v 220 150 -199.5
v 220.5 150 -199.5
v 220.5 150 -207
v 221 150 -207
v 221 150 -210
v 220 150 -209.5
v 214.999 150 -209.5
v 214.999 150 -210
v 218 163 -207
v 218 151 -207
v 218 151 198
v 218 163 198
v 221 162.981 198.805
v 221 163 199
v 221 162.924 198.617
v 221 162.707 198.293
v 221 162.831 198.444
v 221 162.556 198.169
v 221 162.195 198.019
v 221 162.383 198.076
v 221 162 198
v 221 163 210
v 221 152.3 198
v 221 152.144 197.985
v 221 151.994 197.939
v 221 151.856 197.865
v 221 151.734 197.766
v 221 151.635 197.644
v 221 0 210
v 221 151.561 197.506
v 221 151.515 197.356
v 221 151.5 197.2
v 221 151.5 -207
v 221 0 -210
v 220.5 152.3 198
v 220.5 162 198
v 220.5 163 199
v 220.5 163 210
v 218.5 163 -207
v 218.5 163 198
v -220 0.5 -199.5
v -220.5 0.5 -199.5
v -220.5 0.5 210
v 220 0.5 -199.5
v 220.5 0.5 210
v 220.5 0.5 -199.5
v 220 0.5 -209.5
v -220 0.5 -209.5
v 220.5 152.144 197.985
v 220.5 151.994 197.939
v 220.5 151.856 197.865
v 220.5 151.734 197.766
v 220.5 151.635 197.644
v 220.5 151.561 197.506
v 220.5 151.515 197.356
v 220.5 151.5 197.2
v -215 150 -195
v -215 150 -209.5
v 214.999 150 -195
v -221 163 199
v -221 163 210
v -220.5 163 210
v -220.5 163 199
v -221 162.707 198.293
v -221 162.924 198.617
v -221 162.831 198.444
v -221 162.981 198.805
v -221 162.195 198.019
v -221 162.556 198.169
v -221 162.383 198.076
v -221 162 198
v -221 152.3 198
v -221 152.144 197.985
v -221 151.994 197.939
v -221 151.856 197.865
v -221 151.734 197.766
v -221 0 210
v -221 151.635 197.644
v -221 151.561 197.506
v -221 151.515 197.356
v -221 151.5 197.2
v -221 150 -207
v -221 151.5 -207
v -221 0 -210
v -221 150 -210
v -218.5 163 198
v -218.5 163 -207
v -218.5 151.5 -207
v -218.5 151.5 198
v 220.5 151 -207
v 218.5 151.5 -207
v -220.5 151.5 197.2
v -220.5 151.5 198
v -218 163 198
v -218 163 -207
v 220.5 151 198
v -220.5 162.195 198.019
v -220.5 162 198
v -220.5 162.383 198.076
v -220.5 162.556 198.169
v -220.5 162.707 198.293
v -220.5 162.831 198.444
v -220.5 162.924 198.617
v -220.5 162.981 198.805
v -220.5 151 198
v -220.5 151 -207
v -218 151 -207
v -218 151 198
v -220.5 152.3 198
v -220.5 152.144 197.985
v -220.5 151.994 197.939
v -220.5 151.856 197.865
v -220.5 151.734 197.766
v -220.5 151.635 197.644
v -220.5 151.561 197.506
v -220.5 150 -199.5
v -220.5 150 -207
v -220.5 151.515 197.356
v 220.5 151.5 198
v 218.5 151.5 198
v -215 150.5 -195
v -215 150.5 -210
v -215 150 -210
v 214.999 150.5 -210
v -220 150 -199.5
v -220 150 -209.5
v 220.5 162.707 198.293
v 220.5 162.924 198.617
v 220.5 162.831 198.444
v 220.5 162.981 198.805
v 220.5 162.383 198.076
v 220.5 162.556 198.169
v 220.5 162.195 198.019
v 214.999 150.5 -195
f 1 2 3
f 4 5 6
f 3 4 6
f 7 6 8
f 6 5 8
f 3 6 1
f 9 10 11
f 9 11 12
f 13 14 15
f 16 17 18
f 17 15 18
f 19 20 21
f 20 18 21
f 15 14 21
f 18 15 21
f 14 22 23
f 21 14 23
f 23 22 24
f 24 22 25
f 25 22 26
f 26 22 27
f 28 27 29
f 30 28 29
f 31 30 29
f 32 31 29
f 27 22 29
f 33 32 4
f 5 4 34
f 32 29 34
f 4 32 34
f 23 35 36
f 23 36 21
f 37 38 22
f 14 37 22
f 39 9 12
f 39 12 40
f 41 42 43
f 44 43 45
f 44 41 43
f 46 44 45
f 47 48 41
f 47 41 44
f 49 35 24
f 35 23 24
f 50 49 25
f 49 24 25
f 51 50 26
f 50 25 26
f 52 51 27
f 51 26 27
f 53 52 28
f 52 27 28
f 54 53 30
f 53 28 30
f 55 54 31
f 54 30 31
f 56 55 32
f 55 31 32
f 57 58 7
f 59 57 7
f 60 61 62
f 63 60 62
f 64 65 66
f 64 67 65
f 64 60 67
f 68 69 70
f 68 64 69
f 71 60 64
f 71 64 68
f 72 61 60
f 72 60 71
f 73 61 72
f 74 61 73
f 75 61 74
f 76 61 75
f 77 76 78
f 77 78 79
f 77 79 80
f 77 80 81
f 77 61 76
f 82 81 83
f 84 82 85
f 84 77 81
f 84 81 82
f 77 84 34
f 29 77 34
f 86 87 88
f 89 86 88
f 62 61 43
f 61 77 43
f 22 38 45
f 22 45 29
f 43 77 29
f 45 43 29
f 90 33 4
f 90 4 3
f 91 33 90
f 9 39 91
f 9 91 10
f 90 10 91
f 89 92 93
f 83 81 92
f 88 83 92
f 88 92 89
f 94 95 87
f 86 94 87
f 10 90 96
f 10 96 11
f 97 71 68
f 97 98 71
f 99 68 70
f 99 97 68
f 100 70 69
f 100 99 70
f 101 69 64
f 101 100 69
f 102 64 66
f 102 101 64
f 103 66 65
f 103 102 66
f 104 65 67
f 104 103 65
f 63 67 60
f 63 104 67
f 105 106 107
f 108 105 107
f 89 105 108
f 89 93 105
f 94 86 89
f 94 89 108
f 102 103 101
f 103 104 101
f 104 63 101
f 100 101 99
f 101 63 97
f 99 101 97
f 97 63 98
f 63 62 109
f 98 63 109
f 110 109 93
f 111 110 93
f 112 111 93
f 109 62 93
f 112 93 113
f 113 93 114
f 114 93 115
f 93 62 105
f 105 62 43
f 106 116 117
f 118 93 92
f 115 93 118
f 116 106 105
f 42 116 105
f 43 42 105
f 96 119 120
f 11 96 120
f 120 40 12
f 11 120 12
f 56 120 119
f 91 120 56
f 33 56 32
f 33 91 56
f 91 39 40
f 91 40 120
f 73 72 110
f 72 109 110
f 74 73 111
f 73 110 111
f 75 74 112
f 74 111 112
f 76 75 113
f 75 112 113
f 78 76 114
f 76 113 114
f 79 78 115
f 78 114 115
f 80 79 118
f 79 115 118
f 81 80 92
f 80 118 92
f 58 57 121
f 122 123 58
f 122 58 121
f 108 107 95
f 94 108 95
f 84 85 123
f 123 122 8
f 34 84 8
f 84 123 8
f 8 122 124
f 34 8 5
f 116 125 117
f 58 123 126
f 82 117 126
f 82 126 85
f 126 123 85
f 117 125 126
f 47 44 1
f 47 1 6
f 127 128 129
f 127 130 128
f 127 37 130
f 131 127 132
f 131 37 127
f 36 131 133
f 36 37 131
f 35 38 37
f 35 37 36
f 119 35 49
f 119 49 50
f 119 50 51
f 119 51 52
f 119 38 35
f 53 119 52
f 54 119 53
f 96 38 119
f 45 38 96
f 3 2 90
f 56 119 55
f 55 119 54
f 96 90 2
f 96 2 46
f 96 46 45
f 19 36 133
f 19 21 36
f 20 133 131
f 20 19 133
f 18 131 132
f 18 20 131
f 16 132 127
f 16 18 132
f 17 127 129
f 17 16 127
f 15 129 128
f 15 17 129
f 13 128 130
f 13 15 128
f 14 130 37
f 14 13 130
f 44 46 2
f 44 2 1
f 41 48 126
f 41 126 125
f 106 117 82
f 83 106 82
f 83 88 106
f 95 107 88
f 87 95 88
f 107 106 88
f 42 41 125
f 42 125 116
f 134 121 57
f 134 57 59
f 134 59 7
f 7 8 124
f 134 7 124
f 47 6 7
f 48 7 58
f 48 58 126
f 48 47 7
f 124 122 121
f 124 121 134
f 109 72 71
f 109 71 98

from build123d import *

# Parameters (mm, degrees)
SKETCH1_W           = 442
SKETCH1_H           = 420
BOSS_EXTRUDE1_DEPTH = 0.5
SKETCH2_W           = 0.5
SKETCH2_H           = 420
BOSS_EXTRUDE2_DEPTH = 151
BOSS_EXTRUDE5_DEPTH = 408
BOSS_EXTRUDE3_DEPTH = 149.5
SKETCH41_W          = 3
SKETCH41_H          = 13
CUT_EXTRUDE1_DEPTH  = 3
SKETCH42_W          = 430
SKETCH42_H          = 0.5
BOSS_EXTRUDE6_DEPTH = 147.4
SKETCH43_W          = 429.998697479
SKETCH43_H          = 0.5
BOSS_EXTRUDE7_DEPTH = 15
SKETCH44_W          = 0.5
SKETCH44_H          = 12
BOSS_EXTRUDE8_DEPTH = 11.5
FILLET1_R           = 1
FILLET2_R           = 0.8


with BuildPart() as part:
    # Sketch1 → Boss-Extrude1 (new body)
    with BuildSketch(Plane(origin=(0, 0, 0), x_dir=(1, 0, 0), z_dir=(0, 1, 0))):
        Rectangle(SKETCH1_W, SKETCH1_H)
    extrude(amount=BOSS_EXTRUDE1_DEPTH)

    # Sketch2 → Boss-Extrude2 (add)
    with BuildSketch(Plane(origin=(0, 0.5, 0), x_dir=(1, 0, 0), z_dir=(0, 1, 0))):
        with Locations((-220.75, 0)):
            Rectangle(SKETCH2_W, SKETCH2_H)
        with Locations((220.75, 0)):
            Rectangle(SKETCH2_W, SKETCH2_H)
    extrude(amount=BOSS_EXTRUDE2_DEPTH)

    # Sketch39 → Boss-Extrude5 (add)
    with BuildSketch(Plane(origin=(0, 0, -210), x_dir=(-1, 0, 0), z_dir=(0, 0, -1))):
        Polygon((220.5, 151), (218, 151), (218, 163), (218.5, 163), (218.5, 151.5), (220.5, 151.5), align=None)
        Polygon((-220.5, 151.5), (-220.5, 151), (-218, 151), (-218, 163), (-218.5, 163), (-218.5, 151.5), align=None)
    extrude(amount=-BOSS_EXTRUDE5_DEPTH)

    # Sketch41 → Cut-Extrude1 (cut)
    with BuildSketch(Plane(origin=(0, 0, -210), x_dir=(-1, 0, 0), z_dir=(0, 0, -1))):
        with Locations((219.5, 156.5)):
            Rectangle(SKETCH41_W, SKETCH41_H)
        with Locations((-219.5, 156.5)):
            Rectangle(SKETCH41_W, SKETCH41_H)
    extrude(amount=-CUT_EXTRUDE1_DEPTH, mode=Mode.SUBTRACT)


with BuildPart() as body_2:
    # Sketch7 → Boss-Extrude3 (new body)
    with BuildSketch(Plane(origin=(0, 0.5, 0), x_dir=(1, 0, 0), z_dir=(0, 1, 0))):
        Polygon((-220.5, 210), (220.5, 210), (220.5, 199.5), (220, 199.5), (220, 209.5), (-220, 209.5), (-220, 199.5), (-220.5, 199.5), align=None)
    extrude(amount=BOSS_EXTRUDE3_DEPTH)


    add(part.part)  # Boss-Extrude6 merges part
    # Sketch42 → Boss-Extrude6 (add)
    with BuildSketch(Plane(origin=(0, 150, 0), x_dir=(1, 0, 0), z_dir=(0, 1, 0))):
        with Locations((0, 209.75)):
            Rectangle(SKETCH42_W, SKETCH42_H)
    extrude(amount=-BOSS_EXTRUDE6_DEPTH)

    # Sketch43 → Boss-Extrude7 (add)
    with BuildSketch(Plane.XY.offset(-210)):
        with Locations((-0.00065126, 150.25)):
            Rectangle(SKETCH43_W, SKETCH43_H)
    extrude(amount=BOSS_EXTRUDE7_DEPTH)

    # Sketch44 → Boss-Extrude8 (add)
    with BuildSketch(Plane(origin=(0, 151.5, 0), x_dir=(1, 0, 0), z_dir=(0, 1, 0))):
        with Locations((-220.75, -204)):
            Rectangle(SKETCH44_W, SKETCH44_H)
        with Locations((220.75, -204)):
            Rectangle(SKETCH44_W, SKETCH44_H)
    extrude(amount=BOSS_EXTRUDE8_DEPTH)

    # Fillet1
    fillet1_edges = [body_2.edges().sort_by_distance(p)[0] for p in [
        (-220.75, 163, 198),
        (220.75, 163, 198),
    ]]
    fillet(fillet1_edges, radius=FILLET1_R)

    # Fillet2
    fillet2_edges = [body_2.edges().sort_by_distance(p)[0] for p in [
        (-220.75, 151.5, 198),
        (220.75, 151.5, 198),
    ]]
    fillet(fillet2_edges, radius=FILLET2_R)


solid = body_2.part
